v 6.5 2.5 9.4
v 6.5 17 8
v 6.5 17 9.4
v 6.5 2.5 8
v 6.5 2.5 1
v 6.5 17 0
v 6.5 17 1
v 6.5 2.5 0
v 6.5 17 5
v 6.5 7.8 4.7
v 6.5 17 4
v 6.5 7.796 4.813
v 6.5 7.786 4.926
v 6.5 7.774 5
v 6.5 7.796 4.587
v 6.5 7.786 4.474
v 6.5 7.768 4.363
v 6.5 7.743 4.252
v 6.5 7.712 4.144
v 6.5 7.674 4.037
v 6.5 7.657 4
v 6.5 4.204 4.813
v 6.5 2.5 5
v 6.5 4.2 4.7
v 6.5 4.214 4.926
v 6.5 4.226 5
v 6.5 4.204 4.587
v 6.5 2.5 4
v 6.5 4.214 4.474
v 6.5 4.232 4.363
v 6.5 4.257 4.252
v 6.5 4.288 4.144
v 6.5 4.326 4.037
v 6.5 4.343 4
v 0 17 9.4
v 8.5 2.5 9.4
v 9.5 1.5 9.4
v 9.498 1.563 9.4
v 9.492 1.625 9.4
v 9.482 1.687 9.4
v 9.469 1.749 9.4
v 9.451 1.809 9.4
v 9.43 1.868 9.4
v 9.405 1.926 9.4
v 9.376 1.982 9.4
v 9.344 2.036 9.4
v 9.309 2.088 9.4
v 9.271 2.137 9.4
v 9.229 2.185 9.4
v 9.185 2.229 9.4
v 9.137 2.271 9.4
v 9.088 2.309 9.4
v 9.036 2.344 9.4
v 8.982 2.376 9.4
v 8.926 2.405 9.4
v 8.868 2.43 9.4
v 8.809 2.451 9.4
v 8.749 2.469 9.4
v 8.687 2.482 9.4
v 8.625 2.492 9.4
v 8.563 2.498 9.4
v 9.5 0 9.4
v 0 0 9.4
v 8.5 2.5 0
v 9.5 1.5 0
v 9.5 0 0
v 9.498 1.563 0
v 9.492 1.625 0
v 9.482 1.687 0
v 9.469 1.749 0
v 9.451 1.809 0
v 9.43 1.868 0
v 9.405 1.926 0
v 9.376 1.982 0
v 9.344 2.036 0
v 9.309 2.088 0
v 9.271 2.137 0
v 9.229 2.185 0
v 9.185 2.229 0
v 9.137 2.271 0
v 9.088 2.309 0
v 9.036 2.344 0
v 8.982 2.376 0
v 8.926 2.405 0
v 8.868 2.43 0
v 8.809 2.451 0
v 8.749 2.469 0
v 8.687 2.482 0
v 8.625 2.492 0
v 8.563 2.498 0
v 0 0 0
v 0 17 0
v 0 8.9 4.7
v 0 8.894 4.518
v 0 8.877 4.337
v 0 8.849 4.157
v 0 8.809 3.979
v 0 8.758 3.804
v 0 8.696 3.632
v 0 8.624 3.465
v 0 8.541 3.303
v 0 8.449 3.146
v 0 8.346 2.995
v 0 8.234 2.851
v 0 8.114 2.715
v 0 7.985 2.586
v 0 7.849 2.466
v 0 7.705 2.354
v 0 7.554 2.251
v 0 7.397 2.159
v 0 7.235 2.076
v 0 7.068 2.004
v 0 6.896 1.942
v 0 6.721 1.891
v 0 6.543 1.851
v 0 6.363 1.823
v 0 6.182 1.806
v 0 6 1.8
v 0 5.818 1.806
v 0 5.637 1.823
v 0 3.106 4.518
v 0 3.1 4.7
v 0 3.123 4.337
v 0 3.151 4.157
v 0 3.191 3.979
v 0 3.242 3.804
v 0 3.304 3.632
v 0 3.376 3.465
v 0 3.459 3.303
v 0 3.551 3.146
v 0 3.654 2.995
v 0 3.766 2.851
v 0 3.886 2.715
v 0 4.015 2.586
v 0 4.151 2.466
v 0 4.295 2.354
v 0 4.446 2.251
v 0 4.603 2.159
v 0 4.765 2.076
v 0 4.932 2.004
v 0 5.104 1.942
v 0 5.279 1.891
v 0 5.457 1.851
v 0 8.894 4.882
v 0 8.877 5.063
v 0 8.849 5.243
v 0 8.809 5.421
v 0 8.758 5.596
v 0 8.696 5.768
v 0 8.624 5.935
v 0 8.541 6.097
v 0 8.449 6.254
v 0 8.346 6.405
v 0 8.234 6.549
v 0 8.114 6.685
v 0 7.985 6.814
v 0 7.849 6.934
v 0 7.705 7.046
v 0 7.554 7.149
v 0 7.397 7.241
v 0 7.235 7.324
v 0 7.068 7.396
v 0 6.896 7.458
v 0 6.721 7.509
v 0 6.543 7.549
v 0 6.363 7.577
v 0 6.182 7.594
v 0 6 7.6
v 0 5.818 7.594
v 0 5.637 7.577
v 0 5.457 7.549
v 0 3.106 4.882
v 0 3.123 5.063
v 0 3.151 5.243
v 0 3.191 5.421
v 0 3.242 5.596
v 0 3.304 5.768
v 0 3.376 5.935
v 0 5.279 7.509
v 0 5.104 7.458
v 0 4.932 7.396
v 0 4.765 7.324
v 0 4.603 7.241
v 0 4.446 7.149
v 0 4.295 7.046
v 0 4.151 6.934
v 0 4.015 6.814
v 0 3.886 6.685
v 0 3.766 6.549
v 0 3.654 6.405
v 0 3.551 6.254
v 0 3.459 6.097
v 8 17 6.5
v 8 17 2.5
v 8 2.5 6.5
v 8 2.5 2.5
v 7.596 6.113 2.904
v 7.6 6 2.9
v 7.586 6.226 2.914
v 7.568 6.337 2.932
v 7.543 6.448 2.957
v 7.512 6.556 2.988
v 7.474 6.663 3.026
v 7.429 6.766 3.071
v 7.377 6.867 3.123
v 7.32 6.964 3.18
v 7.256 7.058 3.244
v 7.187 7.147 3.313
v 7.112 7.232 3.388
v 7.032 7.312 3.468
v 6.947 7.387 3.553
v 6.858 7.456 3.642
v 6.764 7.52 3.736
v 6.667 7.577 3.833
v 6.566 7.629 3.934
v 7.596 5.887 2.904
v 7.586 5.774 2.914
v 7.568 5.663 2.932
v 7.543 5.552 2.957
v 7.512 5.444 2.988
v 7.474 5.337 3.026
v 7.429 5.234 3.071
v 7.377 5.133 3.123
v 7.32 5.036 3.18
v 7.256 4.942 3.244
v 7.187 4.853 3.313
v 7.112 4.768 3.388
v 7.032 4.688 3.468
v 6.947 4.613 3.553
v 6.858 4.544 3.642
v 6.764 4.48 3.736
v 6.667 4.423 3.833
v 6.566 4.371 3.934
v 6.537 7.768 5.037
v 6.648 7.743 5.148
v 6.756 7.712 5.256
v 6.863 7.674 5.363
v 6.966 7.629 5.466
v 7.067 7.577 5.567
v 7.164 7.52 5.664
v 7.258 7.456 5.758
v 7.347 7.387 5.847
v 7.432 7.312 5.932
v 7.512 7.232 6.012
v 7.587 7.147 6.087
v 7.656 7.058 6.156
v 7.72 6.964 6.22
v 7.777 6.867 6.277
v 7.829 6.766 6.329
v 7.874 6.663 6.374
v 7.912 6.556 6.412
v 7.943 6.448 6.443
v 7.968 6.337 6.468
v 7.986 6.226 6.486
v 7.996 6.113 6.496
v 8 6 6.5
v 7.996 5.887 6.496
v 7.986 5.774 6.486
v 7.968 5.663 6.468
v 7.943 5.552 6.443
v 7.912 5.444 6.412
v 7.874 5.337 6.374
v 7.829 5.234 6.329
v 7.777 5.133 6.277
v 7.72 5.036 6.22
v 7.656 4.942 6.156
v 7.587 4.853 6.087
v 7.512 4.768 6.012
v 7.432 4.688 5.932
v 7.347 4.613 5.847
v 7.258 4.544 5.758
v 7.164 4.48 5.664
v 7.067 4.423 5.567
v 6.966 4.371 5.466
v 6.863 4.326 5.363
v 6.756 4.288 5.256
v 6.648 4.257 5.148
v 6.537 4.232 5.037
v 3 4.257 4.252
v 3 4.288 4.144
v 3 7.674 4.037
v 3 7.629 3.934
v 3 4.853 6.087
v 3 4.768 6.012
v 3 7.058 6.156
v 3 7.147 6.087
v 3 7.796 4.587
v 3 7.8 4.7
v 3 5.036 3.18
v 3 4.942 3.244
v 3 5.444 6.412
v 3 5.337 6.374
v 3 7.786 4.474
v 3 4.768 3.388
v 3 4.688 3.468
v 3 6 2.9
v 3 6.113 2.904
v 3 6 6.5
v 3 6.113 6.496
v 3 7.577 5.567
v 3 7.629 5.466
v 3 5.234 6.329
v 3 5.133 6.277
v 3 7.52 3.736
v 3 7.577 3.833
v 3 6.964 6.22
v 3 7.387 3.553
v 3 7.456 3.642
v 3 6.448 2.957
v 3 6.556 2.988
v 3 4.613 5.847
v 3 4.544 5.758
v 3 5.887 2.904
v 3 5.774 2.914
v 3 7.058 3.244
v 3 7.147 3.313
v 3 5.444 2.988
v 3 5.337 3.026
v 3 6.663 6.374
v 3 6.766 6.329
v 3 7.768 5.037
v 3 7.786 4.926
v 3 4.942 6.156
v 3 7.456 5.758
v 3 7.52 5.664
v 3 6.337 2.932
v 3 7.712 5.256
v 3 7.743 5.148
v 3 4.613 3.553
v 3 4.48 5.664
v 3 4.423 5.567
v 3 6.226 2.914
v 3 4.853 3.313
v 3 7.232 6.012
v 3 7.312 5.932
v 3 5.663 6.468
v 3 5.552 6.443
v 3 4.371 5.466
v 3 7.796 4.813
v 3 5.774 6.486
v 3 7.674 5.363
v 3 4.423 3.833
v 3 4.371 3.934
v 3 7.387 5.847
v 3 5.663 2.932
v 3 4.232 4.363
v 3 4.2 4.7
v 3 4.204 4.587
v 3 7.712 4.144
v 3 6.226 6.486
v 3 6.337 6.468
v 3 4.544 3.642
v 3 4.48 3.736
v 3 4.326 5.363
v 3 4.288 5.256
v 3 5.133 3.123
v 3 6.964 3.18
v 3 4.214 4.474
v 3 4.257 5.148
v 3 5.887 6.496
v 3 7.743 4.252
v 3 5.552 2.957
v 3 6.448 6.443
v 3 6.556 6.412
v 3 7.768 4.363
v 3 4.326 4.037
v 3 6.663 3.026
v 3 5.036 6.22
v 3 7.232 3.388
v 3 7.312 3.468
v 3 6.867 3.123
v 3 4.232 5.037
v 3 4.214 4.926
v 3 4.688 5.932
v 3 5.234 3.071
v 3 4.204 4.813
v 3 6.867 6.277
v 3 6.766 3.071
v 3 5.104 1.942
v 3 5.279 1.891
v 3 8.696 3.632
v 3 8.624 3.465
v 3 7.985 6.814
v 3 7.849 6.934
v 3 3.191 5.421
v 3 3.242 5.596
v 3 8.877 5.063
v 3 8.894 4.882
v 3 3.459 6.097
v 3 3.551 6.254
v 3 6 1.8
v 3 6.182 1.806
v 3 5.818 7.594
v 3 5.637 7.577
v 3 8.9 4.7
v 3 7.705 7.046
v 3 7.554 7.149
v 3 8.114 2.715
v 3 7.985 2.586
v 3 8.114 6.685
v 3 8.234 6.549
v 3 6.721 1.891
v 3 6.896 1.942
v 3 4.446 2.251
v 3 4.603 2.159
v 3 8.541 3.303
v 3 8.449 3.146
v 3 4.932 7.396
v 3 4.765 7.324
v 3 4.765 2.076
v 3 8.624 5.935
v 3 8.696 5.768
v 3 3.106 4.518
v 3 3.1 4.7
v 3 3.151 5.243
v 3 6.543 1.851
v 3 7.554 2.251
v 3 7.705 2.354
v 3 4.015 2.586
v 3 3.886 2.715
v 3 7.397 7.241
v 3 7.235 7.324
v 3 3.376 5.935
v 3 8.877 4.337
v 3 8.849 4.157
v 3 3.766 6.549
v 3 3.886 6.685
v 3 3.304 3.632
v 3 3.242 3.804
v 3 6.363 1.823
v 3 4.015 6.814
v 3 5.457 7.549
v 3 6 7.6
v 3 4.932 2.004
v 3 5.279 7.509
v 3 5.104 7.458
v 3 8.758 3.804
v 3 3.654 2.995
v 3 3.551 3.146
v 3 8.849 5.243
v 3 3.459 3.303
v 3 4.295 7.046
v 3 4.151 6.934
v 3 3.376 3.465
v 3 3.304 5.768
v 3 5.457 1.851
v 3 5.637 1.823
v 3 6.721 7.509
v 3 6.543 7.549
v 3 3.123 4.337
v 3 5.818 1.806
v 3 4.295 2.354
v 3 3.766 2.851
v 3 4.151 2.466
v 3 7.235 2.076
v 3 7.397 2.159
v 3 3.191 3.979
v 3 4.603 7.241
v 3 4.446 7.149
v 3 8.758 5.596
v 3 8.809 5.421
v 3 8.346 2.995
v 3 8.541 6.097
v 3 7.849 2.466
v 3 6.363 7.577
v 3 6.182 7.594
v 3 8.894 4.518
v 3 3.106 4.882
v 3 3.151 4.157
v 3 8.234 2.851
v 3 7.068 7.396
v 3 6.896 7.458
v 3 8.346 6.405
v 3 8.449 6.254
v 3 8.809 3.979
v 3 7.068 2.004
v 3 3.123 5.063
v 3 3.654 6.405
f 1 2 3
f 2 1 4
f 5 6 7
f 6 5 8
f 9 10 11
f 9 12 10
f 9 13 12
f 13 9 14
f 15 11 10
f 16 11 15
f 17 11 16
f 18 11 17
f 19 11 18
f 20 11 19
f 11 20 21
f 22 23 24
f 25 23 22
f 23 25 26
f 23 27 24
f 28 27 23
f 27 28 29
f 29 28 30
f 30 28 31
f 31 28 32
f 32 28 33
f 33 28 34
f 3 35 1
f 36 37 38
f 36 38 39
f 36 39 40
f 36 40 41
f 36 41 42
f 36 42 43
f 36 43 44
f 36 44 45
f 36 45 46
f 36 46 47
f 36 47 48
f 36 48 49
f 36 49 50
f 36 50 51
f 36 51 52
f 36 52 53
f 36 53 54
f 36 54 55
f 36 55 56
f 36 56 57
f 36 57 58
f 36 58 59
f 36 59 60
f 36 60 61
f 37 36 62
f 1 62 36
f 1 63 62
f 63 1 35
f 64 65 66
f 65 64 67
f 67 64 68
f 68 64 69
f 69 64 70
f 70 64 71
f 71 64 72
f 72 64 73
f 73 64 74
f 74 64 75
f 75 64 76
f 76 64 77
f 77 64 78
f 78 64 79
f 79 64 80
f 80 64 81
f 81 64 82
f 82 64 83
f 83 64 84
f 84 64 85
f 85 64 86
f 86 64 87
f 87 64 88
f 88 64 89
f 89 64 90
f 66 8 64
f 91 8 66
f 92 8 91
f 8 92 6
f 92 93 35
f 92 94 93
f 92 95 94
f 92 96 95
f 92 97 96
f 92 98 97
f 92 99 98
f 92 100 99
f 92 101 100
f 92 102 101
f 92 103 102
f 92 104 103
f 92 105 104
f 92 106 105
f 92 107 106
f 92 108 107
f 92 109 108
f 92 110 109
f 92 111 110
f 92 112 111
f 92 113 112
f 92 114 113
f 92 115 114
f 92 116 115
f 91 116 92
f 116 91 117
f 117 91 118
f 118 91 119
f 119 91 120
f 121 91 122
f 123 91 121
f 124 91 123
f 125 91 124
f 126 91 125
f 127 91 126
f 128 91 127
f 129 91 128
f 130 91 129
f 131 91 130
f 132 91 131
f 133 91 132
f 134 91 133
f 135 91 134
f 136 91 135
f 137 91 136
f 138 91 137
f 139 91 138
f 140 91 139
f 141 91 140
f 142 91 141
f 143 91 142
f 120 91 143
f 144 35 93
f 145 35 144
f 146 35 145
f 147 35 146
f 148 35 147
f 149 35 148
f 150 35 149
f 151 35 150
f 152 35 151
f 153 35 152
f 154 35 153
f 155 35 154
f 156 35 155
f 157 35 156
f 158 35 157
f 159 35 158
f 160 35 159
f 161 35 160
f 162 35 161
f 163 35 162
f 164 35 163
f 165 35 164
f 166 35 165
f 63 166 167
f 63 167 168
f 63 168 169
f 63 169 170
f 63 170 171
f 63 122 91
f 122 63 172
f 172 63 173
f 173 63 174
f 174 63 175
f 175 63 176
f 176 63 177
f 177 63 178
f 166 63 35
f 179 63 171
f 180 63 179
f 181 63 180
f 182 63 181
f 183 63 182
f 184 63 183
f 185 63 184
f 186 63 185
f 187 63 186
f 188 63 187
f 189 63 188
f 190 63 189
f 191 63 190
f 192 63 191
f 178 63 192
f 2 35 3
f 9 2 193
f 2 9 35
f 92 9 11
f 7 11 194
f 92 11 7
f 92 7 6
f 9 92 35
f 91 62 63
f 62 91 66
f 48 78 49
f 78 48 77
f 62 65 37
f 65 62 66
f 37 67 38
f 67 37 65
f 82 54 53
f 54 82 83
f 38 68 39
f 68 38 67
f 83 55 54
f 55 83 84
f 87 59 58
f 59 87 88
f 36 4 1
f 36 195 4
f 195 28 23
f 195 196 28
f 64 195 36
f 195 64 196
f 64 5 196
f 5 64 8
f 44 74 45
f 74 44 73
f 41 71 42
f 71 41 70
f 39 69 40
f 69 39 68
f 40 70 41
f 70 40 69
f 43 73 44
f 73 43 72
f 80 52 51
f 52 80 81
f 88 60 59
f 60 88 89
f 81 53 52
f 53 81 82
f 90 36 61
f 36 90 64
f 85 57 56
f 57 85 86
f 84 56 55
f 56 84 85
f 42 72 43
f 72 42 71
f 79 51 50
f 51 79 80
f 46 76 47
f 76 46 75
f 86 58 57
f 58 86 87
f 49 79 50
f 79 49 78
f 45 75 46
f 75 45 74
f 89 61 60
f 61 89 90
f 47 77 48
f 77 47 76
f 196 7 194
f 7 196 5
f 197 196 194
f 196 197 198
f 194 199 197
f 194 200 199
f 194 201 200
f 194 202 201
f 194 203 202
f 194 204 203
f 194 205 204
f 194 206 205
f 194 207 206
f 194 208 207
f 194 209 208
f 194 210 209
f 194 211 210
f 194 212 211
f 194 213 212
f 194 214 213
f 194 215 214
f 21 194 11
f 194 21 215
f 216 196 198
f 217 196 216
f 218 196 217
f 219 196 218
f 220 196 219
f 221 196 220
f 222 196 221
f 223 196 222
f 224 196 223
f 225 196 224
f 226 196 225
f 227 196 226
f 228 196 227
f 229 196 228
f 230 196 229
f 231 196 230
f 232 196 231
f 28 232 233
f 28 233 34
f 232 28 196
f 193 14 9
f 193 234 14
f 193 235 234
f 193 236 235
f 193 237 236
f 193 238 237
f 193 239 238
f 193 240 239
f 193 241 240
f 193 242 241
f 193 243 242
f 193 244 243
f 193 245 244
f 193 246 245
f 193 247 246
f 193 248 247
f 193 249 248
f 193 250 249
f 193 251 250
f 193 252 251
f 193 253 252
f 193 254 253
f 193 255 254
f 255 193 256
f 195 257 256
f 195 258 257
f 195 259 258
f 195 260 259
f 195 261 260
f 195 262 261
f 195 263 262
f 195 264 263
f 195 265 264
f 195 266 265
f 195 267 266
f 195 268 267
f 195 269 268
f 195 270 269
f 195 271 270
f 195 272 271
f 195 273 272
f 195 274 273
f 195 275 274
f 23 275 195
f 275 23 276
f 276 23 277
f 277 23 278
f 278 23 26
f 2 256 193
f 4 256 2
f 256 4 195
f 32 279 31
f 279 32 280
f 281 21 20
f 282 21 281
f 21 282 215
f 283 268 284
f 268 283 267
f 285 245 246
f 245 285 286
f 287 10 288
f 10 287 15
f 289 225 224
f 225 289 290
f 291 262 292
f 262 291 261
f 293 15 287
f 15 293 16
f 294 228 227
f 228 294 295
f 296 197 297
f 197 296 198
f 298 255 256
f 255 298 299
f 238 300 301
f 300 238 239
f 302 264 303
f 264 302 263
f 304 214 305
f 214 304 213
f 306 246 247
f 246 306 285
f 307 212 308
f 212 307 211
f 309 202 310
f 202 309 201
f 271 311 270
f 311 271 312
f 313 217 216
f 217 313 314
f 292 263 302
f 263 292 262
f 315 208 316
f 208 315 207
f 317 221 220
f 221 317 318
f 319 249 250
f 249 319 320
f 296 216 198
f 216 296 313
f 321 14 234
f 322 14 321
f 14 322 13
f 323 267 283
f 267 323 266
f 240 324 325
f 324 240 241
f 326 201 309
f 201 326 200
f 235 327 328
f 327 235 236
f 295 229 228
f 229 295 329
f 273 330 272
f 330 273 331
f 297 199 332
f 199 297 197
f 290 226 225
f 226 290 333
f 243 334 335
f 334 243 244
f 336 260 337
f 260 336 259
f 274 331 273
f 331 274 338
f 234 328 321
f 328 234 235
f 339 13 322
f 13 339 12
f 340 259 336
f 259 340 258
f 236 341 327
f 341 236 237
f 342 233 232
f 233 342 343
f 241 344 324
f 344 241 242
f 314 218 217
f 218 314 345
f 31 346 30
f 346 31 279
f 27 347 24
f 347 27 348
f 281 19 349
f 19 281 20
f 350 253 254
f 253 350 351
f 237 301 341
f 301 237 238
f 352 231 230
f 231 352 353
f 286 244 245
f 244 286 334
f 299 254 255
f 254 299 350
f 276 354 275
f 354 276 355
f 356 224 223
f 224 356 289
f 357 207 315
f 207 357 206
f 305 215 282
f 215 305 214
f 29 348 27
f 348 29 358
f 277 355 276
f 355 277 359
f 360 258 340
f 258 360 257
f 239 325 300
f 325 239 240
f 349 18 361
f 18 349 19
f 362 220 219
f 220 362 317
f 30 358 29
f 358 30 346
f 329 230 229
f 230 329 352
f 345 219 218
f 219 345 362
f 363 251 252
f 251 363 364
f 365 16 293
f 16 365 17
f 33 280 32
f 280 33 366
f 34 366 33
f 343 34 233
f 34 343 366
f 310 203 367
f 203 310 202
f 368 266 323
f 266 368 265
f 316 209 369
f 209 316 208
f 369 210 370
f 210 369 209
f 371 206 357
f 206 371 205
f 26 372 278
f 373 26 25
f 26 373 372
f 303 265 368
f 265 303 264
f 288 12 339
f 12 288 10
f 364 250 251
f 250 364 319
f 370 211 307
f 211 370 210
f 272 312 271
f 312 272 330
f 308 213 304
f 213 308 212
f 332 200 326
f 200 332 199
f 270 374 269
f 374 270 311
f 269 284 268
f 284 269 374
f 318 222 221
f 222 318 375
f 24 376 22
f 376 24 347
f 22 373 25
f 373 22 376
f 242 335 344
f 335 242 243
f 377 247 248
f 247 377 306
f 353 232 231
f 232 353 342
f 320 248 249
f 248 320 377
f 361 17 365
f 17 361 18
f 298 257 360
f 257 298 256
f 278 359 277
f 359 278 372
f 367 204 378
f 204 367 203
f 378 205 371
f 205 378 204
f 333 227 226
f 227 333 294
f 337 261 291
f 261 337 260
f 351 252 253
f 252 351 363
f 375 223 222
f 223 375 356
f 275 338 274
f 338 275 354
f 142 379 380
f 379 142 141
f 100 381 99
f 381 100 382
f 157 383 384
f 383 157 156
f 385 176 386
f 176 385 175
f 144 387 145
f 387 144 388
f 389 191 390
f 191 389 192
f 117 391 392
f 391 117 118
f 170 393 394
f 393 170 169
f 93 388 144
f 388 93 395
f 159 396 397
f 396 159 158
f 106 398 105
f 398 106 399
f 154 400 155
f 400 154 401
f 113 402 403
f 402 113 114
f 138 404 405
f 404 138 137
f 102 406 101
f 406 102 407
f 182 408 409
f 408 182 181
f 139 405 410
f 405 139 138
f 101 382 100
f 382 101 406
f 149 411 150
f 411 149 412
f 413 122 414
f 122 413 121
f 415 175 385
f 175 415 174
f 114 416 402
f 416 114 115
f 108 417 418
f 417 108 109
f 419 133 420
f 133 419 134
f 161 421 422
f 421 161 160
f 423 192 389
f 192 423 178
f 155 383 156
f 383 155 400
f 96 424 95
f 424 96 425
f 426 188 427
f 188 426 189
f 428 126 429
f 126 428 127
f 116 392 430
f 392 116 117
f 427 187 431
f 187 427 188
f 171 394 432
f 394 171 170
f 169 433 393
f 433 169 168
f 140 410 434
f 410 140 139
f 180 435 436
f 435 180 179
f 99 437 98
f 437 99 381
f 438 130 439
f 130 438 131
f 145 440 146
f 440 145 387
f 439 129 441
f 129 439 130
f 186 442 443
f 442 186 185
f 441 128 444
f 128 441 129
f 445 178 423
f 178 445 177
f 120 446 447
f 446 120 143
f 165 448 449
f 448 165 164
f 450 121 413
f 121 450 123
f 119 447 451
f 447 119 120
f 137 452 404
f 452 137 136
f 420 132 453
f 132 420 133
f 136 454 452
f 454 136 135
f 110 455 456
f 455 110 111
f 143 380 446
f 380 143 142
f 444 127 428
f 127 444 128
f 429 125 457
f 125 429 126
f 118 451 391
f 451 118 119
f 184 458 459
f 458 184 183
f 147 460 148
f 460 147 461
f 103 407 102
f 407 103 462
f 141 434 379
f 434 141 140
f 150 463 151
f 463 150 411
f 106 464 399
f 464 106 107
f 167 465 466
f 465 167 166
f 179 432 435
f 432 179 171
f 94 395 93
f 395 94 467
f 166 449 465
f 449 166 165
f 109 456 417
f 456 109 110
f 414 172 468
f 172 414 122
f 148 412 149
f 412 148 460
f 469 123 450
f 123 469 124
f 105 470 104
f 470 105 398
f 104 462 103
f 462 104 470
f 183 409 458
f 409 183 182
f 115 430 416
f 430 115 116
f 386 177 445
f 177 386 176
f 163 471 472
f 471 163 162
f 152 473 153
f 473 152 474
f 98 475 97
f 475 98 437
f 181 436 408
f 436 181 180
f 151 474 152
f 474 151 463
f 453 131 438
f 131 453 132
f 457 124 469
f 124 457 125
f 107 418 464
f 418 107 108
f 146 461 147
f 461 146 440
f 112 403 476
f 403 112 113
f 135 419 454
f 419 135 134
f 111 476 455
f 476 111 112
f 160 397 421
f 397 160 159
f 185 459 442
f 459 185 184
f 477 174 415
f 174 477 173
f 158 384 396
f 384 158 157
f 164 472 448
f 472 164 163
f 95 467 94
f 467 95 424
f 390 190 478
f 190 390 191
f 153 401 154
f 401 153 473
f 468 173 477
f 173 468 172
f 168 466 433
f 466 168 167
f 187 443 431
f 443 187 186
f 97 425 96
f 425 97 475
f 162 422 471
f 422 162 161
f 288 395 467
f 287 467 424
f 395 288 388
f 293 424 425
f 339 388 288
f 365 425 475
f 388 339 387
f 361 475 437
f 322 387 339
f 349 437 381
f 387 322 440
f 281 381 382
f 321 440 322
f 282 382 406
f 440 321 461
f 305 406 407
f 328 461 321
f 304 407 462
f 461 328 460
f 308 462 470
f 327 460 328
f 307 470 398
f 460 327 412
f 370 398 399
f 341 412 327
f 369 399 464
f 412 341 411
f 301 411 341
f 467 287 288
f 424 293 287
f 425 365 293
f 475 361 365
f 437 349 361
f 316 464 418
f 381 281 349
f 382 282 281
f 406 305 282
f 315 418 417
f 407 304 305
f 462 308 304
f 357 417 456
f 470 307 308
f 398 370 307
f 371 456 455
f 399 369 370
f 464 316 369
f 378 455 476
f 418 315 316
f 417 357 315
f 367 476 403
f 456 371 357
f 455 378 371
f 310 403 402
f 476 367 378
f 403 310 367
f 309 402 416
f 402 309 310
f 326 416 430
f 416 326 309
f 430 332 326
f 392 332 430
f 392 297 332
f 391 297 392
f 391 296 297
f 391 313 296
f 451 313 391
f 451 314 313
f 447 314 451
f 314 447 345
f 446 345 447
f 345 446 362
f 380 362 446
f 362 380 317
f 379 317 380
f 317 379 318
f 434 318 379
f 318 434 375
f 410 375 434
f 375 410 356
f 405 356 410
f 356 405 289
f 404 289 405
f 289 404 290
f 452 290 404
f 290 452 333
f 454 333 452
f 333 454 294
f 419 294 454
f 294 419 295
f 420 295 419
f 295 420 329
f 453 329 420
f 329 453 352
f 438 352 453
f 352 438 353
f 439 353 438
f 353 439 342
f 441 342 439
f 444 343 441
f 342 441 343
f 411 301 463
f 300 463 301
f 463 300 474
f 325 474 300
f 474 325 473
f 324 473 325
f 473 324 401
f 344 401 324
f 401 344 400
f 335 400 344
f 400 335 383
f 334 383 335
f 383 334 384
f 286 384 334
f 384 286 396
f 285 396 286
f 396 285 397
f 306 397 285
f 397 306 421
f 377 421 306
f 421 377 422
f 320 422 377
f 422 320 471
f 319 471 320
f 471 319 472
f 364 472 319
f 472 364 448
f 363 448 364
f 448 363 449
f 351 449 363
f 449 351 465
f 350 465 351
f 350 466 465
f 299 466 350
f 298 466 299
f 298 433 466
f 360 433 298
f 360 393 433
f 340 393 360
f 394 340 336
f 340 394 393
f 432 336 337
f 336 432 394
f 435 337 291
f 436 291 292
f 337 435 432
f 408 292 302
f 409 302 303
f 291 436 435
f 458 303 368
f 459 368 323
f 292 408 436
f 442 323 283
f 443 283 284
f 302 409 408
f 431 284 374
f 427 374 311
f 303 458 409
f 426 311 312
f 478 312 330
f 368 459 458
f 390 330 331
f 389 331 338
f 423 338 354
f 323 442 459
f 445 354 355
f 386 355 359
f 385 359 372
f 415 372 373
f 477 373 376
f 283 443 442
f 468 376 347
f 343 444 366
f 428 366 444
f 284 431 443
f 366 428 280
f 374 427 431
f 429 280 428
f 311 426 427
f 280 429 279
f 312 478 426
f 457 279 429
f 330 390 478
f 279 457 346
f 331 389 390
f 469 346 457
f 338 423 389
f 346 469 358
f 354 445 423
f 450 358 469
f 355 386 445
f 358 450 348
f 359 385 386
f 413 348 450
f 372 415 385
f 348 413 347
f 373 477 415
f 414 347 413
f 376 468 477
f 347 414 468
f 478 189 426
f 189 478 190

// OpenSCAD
// Created from Code_Xcarriage_B.stl
// https://github.com/Mecan0/Code
// By J.Rodigo (www.jra.so)
// Licence Creative commons atribution & share alike.

/**************************/
// Parámetros de la pieza  /
/**************************/

dGran = 5.8;	// Diámetro del taladro exterior (5.8)
dPeque = 3.6;	// Diámetro del taladro interior (3.6)


// Dientes de sujeción 
module diente(){
	rotate( -135, [0, 1, 0])
	cube([3, 14.5, 3]);
}

// Saliente redondeado 
module saliente(){
	hull(){
		// Parte plana
		translate([6.5, 0, 0])
		cube([3, 1.5, 9.4]);
		translate([6.5, 1.5, 0])
		cube([2, 1, 9.4]);
		// Redondeo 
		translate([8.5, 1.5, 0])
		cylinder(h = 9.4, r = 1, $fn=100);
	}
}

// Taladros de la pieza
module taladro(){
	// Pequeño
	translate([-1, 6, 4.7])
	rotate( 90, [0, 1, 0])
	cylinder(h = 10, r = dPeque/2, $fn=100);
	// Grande
	translate([-1, 6, 4.7])
	rotate( 90, [0, 1, 0])
	cylinder(h = 4, r = dGran/2, $fn=100);
}

// Pieza y las operaciones
module pieza(){
	difference () {
		// Parte solida de la pieza
		union() {
			// Cubo base a lo largo del eje Y
			cube([6.5, 17, 9.4]);	
			// Saliente redondeado
			saliente();
			// Posicionamos los dos diente 
			translate([8, 2.5, 2.5])
			diente();
			translate([8, 2.5, 6.5])
			diente();
		}
		// Aplicamos los taladros
		taladro();
	}	
}

// Generamos la pieza!!

	pieza();
